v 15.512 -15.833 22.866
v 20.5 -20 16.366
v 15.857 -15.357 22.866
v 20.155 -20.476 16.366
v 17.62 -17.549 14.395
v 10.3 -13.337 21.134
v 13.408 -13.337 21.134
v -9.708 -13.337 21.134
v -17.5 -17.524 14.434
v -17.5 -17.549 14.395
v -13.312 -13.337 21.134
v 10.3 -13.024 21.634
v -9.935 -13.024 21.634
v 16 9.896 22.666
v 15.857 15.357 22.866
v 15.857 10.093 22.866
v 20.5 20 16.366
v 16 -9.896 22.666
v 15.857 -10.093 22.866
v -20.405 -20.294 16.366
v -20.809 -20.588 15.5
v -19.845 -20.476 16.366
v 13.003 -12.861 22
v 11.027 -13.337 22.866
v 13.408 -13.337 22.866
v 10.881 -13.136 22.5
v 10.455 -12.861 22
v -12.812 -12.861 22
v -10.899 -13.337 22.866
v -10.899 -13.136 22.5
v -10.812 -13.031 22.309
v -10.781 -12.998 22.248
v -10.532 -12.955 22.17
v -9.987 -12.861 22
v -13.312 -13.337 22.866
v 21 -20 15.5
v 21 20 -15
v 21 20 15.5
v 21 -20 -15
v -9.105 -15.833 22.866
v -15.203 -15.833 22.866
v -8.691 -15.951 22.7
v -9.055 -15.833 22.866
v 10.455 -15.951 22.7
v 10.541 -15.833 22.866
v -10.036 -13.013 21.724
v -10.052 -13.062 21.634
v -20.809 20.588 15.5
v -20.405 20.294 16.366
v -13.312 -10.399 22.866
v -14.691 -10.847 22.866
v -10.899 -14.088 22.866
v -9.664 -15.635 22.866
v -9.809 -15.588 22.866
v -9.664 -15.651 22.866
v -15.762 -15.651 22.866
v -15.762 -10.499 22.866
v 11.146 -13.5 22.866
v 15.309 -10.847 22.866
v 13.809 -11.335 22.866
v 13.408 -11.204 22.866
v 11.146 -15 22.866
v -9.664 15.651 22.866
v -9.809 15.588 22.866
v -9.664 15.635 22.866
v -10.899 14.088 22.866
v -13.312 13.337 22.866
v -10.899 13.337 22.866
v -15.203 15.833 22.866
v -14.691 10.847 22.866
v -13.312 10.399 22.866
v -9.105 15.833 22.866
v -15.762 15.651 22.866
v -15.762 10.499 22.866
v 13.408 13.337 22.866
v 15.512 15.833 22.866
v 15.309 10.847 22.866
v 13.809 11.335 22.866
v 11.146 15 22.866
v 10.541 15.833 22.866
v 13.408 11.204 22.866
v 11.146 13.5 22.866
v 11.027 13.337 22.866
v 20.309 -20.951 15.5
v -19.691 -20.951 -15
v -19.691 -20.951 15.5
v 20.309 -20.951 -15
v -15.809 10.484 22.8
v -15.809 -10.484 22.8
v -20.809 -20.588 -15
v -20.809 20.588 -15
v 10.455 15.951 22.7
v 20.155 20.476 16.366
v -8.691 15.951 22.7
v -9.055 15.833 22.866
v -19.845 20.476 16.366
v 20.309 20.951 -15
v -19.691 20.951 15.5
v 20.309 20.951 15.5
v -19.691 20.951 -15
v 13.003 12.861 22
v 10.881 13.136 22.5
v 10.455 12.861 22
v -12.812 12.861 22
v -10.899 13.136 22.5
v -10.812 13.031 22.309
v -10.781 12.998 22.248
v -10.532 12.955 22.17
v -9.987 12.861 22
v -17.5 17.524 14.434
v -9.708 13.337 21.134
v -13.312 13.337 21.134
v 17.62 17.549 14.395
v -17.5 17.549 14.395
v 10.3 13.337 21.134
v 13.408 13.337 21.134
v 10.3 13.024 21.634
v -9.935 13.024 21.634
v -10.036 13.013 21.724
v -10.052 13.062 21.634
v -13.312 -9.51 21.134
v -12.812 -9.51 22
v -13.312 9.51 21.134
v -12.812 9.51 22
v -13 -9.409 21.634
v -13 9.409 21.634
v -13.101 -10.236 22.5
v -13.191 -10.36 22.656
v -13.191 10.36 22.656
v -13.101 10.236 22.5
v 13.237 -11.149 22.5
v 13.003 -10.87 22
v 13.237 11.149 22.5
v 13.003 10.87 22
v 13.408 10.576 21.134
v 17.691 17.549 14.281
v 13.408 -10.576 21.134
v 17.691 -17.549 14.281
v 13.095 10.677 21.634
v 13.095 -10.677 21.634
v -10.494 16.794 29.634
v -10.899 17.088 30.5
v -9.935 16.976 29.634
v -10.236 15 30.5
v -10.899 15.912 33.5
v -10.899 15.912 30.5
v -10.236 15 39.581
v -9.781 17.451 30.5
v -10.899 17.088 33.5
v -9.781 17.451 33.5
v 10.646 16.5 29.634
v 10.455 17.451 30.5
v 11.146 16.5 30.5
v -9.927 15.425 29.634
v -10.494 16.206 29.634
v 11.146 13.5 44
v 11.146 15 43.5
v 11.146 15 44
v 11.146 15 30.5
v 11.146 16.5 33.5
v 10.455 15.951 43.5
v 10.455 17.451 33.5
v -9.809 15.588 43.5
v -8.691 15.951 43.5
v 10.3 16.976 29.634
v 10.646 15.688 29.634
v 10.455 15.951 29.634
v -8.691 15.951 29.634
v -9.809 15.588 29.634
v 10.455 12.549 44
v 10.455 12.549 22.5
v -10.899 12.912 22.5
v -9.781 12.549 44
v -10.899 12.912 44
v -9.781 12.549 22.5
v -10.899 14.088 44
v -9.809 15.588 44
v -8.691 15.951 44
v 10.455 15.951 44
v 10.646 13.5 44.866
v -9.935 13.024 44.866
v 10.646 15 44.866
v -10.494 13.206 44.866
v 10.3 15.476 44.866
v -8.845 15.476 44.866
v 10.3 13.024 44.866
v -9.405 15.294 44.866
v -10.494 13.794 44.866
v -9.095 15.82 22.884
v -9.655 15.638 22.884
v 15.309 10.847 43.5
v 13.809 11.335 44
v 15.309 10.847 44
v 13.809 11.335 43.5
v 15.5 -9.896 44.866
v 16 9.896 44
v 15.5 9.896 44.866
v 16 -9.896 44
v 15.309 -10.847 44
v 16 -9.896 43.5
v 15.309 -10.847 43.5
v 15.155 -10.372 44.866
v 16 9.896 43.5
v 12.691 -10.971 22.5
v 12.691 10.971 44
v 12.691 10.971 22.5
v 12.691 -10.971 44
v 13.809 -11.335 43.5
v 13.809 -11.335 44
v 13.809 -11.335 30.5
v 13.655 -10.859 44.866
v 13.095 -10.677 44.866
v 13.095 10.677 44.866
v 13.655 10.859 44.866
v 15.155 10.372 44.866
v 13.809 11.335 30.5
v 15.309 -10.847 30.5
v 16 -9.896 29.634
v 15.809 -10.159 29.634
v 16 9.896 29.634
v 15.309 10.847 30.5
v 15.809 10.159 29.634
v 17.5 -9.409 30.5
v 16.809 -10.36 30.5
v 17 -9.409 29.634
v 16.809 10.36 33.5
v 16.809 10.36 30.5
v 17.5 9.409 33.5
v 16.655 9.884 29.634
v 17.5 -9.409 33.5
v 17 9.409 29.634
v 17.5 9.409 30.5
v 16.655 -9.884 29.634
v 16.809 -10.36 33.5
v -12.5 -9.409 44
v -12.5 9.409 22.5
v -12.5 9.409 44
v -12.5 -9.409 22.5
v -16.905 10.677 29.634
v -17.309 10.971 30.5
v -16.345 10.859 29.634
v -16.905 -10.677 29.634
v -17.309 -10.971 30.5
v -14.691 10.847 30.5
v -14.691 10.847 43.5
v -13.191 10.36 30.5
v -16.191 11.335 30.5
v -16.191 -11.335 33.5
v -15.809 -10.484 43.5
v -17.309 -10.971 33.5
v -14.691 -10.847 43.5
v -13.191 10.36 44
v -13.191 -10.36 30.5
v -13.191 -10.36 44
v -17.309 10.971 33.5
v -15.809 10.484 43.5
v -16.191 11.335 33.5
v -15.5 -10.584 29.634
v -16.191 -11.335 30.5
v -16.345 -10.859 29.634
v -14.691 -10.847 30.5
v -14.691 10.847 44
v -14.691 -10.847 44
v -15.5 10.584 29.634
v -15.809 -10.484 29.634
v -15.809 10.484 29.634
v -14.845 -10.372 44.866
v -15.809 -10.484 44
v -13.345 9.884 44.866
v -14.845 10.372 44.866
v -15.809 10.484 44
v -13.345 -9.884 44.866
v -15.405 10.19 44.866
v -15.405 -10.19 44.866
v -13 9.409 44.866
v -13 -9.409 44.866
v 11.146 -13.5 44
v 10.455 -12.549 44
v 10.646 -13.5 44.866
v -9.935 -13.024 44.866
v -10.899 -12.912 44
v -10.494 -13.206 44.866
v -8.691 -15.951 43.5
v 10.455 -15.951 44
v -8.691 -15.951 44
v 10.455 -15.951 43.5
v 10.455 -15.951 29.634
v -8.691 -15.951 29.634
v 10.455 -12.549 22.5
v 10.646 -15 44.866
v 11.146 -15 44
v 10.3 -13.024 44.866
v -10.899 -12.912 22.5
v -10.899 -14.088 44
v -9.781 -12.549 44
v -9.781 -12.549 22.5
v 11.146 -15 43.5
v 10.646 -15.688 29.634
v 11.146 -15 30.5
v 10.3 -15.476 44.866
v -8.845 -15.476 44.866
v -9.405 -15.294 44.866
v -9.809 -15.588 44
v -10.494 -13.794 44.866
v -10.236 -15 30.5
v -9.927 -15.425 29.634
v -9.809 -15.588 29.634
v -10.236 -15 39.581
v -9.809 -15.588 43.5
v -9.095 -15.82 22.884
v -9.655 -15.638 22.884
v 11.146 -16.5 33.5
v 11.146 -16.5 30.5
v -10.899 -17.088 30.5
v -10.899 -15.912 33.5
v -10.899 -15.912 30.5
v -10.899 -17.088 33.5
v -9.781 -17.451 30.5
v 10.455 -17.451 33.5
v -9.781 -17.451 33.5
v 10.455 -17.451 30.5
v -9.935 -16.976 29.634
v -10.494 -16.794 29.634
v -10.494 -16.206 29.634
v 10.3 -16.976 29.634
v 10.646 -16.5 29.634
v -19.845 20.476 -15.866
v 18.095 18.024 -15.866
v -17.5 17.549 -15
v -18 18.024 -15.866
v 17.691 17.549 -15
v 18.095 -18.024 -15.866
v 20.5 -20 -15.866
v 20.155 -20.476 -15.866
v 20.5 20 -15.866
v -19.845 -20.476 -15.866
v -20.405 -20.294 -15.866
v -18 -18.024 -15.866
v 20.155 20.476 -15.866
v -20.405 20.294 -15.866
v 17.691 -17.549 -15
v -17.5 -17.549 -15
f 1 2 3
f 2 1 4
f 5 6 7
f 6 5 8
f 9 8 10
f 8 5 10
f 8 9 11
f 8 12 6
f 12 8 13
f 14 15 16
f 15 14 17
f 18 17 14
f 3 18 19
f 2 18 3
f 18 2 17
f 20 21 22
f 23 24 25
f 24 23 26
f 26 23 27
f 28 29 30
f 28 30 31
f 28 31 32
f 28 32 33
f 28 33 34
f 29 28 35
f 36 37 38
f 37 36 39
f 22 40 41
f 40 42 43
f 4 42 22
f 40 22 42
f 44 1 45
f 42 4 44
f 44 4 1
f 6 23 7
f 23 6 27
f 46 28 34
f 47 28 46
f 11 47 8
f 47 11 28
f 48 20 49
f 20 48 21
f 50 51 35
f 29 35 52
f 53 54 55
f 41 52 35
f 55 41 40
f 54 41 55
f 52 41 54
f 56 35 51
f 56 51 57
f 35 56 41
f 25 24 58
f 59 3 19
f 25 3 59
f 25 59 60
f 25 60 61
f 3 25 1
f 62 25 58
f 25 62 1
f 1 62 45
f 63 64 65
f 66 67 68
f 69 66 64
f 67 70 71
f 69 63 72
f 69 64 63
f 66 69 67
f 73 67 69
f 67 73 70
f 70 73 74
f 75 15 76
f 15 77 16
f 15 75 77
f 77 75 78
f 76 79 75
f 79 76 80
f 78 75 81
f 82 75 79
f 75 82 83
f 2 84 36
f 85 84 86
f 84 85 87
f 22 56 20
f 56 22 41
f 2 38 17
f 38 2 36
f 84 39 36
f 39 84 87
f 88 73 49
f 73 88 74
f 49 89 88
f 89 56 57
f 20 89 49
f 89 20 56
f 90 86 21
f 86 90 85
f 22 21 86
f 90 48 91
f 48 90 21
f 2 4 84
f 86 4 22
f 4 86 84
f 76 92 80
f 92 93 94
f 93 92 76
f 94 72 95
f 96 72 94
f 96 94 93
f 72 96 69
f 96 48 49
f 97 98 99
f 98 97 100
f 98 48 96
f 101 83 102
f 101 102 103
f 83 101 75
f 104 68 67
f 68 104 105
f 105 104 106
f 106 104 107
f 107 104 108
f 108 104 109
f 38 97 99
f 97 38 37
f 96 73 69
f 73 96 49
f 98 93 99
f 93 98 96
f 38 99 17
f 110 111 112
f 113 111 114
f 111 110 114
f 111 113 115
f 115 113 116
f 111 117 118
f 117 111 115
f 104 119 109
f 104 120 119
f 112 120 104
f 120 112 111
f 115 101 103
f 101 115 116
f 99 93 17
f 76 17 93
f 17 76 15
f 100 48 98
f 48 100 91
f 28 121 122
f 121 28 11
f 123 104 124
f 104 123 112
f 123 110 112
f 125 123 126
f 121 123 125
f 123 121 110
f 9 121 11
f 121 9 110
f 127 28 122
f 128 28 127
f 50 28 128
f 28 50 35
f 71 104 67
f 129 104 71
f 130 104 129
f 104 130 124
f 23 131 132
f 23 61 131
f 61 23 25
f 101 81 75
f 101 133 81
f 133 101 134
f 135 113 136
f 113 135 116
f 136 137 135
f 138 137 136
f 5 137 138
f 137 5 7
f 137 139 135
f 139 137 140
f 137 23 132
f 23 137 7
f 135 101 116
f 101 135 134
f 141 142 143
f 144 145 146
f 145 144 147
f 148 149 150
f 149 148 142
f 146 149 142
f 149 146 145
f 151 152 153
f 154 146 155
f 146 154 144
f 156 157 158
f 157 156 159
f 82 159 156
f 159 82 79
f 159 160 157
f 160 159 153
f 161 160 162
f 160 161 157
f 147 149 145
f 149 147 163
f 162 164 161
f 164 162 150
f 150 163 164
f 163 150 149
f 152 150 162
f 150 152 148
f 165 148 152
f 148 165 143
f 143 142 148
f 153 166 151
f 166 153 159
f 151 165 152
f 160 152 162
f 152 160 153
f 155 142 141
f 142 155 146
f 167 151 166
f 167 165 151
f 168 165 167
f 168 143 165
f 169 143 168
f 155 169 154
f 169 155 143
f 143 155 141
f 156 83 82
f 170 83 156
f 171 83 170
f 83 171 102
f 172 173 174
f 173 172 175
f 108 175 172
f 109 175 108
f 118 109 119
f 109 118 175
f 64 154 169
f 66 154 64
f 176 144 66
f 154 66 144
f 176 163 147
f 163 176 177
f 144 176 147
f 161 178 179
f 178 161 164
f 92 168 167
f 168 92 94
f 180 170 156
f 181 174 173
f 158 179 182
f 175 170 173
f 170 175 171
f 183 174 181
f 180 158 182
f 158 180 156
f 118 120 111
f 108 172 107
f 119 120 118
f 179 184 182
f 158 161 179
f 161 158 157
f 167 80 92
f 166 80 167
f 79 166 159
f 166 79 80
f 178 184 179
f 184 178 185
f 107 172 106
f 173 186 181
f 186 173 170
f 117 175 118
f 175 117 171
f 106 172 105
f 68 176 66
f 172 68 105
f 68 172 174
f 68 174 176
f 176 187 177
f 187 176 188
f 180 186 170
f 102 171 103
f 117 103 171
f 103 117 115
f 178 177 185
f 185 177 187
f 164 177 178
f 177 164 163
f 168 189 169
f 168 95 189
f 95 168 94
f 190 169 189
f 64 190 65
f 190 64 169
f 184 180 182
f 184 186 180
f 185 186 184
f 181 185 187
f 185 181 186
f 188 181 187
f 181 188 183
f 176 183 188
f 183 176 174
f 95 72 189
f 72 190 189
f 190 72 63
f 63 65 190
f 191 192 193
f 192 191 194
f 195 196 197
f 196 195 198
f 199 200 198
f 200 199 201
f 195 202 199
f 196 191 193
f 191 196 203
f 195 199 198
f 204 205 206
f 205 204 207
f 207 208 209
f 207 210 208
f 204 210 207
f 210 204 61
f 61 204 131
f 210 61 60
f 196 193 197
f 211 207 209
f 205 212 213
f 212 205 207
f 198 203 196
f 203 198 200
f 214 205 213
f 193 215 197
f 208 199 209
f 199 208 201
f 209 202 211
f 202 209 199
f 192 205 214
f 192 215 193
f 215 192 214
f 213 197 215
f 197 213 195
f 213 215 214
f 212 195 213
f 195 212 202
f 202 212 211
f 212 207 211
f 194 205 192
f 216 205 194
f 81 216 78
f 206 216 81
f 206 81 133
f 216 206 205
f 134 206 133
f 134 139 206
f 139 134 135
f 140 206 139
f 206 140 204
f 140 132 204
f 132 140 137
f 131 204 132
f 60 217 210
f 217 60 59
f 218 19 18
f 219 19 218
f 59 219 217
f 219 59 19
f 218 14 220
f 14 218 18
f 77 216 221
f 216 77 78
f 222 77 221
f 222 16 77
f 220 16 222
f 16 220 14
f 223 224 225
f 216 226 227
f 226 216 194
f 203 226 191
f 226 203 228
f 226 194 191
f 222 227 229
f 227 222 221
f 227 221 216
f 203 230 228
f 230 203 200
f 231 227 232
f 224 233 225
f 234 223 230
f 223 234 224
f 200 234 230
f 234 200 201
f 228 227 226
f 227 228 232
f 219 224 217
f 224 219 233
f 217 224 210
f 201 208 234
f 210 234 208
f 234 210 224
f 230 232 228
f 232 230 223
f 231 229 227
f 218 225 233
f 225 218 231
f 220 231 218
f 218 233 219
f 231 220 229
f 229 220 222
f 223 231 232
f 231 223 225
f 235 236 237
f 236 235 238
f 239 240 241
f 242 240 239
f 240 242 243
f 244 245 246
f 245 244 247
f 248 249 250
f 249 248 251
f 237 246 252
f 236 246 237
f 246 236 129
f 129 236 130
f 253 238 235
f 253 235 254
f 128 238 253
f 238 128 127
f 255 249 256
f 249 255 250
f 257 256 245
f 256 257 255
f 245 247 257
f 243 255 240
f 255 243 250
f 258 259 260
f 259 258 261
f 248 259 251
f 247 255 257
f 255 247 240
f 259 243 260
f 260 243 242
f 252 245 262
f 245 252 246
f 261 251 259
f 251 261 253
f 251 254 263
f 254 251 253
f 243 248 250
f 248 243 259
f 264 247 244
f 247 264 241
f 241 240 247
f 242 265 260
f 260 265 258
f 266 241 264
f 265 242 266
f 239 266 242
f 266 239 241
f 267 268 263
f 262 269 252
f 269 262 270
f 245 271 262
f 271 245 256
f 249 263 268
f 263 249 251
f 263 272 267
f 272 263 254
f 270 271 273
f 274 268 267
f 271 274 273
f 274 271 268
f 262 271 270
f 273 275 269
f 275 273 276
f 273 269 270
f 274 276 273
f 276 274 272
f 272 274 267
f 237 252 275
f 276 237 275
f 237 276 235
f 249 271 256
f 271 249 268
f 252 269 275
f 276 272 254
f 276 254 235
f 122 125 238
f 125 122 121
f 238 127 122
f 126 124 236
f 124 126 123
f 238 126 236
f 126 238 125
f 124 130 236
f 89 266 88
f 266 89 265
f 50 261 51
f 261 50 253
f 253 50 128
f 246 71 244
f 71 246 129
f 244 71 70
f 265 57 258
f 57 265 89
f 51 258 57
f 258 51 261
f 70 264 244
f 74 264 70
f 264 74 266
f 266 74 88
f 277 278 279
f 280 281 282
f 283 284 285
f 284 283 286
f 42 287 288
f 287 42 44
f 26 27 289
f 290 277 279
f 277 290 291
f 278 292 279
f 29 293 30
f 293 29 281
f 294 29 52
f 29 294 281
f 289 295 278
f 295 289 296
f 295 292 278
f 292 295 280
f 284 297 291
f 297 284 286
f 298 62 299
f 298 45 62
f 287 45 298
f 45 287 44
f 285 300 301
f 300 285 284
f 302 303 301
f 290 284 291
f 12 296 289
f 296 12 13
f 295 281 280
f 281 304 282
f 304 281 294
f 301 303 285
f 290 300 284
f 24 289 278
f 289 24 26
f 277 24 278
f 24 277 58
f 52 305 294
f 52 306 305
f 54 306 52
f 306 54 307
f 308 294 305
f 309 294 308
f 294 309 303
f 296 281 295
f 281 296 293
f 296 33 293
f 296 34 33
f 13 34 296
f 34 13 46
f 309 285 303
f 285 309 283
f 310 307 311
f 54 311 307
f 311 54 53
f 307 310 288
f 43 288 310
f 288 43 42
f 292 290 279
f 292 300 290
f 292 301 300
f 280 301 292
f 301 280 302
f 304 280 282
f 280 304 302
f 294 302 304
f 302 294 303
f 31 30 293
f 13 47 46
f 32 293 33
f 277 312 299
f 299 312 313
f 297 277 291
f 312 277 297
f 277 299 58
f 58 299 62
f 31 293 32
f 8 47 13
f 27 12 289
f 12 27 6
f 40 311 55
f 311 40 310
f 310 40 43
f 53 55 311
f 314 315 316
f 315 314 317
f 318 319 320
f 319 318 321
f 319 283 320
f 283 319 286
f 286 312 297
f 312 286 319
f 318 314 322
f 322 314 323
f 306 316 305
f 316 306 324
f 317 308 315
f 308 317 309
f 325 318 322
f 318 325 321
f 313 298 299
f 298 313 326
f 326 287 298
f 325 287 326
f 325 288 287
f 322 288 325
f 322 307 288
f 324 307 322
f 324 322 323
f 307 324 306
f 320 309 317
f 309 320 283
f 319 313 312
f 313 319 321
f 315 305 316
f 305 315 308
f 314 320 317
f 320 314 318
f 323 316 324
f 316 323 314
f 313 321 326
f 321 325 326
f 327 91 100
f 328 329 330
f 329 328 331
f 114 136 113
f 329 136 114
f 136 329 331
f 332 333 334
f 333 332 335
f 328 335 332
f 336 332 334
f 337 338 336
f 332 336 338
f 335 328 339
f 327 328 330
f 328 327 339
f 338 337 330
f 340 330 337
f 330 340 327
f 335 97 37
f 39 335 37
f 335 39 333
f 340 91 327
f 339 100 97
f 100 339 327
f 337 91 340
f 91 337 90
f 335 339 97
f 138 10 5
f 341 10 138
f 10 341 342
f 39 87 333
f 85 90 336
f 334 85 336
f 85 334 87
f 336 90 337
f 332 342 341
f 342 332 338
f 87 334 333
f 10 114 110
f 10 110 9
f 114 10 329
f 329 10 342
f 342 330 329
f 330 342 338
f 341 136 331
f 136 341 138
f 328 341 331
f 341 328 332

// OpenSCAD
$fn=5;

module beam(w,h,d,j) {
    translate([0,0,30-1])
    clip(30,30,30,3,7,false );
    minkowski() {
        sphere(r=1);
        difference() {
            cube([w,h,d], center=true);

            cube([w-j,h-j,d], center=true);
        }
    }
}

module socket_beam(w,h,d,j) {

    difference() {
        minkowski() {
            sphere(r=1);
            difference() {
                
                cube([w,h,d], center=true);
                cube([w-j,h-j,d], center=true);
            }
        }
        translate([0,0,-2])
        scale([1.06,1.06,1.06])
        clip(w-10,h-10,30,j,7, true);
    }

        //    translate([0,0,-1])
            //cube([w-j,h-j,d-1], center=true);
        //}
    
    
    
}

// j - jut
//k - drop
module clip(w,h,d, j,k,filled=true) {
    minkowski() {
        sphere(r=1);
        difference() {
            union() {
                translate([0,0,j])
                hull() {
                    translate([0,0,d/2-k])
                    cube([w,h,k], center=true);
                
                    cube([w+j,h+j,j], center=true);
                }
                // base camfer outer
                hull() {
                    translate([0,0,-d+16])
                    cube([40,40,1],center=true);

                    translate([0,0,(d/2-k-d/2)])
                    cube([30,30,1],center=true);
                }
                 
                cube([w,h,d], center=true);

                
  
                
            }
            cube([w-j,h-j,d],center=true);
           hull() {
                translate([0,0,-d/2])
                cube([40-j,40-j,1],center=true);

                translate([0,0,(d/2-k-d/2)])
                cube([30-j,30-j,1],center=true);
            }

 
            // 4x cylinder cutouts
            translate([w/2,h/2,d/2-k])
            cylinder(r=j*2,h=d,center=true);

            translate([-w/2,h/2,d/2-k])
            cylinder(r=j*2,h=d,center=true);
            
            translate([-w/2,-h/2,d/2-k])
            cylinder(r=j*2,h=d,center=true);
            
            translate([w/2,-h/2,d/2-k])
            cylinder(r=j*2,h=d,center=true);
     
     
            }
    }
   
    
    if (filled) {
        cube([w,h,d],center=true);
    }
    
}



//clip(30,30,30,3,7,false );

//translate([0,0,-30])
//beam(40,40,30,3);

//translate([0,0,80])
//socket_beam(40,40,30,4);


beam(40,40,30,3);
